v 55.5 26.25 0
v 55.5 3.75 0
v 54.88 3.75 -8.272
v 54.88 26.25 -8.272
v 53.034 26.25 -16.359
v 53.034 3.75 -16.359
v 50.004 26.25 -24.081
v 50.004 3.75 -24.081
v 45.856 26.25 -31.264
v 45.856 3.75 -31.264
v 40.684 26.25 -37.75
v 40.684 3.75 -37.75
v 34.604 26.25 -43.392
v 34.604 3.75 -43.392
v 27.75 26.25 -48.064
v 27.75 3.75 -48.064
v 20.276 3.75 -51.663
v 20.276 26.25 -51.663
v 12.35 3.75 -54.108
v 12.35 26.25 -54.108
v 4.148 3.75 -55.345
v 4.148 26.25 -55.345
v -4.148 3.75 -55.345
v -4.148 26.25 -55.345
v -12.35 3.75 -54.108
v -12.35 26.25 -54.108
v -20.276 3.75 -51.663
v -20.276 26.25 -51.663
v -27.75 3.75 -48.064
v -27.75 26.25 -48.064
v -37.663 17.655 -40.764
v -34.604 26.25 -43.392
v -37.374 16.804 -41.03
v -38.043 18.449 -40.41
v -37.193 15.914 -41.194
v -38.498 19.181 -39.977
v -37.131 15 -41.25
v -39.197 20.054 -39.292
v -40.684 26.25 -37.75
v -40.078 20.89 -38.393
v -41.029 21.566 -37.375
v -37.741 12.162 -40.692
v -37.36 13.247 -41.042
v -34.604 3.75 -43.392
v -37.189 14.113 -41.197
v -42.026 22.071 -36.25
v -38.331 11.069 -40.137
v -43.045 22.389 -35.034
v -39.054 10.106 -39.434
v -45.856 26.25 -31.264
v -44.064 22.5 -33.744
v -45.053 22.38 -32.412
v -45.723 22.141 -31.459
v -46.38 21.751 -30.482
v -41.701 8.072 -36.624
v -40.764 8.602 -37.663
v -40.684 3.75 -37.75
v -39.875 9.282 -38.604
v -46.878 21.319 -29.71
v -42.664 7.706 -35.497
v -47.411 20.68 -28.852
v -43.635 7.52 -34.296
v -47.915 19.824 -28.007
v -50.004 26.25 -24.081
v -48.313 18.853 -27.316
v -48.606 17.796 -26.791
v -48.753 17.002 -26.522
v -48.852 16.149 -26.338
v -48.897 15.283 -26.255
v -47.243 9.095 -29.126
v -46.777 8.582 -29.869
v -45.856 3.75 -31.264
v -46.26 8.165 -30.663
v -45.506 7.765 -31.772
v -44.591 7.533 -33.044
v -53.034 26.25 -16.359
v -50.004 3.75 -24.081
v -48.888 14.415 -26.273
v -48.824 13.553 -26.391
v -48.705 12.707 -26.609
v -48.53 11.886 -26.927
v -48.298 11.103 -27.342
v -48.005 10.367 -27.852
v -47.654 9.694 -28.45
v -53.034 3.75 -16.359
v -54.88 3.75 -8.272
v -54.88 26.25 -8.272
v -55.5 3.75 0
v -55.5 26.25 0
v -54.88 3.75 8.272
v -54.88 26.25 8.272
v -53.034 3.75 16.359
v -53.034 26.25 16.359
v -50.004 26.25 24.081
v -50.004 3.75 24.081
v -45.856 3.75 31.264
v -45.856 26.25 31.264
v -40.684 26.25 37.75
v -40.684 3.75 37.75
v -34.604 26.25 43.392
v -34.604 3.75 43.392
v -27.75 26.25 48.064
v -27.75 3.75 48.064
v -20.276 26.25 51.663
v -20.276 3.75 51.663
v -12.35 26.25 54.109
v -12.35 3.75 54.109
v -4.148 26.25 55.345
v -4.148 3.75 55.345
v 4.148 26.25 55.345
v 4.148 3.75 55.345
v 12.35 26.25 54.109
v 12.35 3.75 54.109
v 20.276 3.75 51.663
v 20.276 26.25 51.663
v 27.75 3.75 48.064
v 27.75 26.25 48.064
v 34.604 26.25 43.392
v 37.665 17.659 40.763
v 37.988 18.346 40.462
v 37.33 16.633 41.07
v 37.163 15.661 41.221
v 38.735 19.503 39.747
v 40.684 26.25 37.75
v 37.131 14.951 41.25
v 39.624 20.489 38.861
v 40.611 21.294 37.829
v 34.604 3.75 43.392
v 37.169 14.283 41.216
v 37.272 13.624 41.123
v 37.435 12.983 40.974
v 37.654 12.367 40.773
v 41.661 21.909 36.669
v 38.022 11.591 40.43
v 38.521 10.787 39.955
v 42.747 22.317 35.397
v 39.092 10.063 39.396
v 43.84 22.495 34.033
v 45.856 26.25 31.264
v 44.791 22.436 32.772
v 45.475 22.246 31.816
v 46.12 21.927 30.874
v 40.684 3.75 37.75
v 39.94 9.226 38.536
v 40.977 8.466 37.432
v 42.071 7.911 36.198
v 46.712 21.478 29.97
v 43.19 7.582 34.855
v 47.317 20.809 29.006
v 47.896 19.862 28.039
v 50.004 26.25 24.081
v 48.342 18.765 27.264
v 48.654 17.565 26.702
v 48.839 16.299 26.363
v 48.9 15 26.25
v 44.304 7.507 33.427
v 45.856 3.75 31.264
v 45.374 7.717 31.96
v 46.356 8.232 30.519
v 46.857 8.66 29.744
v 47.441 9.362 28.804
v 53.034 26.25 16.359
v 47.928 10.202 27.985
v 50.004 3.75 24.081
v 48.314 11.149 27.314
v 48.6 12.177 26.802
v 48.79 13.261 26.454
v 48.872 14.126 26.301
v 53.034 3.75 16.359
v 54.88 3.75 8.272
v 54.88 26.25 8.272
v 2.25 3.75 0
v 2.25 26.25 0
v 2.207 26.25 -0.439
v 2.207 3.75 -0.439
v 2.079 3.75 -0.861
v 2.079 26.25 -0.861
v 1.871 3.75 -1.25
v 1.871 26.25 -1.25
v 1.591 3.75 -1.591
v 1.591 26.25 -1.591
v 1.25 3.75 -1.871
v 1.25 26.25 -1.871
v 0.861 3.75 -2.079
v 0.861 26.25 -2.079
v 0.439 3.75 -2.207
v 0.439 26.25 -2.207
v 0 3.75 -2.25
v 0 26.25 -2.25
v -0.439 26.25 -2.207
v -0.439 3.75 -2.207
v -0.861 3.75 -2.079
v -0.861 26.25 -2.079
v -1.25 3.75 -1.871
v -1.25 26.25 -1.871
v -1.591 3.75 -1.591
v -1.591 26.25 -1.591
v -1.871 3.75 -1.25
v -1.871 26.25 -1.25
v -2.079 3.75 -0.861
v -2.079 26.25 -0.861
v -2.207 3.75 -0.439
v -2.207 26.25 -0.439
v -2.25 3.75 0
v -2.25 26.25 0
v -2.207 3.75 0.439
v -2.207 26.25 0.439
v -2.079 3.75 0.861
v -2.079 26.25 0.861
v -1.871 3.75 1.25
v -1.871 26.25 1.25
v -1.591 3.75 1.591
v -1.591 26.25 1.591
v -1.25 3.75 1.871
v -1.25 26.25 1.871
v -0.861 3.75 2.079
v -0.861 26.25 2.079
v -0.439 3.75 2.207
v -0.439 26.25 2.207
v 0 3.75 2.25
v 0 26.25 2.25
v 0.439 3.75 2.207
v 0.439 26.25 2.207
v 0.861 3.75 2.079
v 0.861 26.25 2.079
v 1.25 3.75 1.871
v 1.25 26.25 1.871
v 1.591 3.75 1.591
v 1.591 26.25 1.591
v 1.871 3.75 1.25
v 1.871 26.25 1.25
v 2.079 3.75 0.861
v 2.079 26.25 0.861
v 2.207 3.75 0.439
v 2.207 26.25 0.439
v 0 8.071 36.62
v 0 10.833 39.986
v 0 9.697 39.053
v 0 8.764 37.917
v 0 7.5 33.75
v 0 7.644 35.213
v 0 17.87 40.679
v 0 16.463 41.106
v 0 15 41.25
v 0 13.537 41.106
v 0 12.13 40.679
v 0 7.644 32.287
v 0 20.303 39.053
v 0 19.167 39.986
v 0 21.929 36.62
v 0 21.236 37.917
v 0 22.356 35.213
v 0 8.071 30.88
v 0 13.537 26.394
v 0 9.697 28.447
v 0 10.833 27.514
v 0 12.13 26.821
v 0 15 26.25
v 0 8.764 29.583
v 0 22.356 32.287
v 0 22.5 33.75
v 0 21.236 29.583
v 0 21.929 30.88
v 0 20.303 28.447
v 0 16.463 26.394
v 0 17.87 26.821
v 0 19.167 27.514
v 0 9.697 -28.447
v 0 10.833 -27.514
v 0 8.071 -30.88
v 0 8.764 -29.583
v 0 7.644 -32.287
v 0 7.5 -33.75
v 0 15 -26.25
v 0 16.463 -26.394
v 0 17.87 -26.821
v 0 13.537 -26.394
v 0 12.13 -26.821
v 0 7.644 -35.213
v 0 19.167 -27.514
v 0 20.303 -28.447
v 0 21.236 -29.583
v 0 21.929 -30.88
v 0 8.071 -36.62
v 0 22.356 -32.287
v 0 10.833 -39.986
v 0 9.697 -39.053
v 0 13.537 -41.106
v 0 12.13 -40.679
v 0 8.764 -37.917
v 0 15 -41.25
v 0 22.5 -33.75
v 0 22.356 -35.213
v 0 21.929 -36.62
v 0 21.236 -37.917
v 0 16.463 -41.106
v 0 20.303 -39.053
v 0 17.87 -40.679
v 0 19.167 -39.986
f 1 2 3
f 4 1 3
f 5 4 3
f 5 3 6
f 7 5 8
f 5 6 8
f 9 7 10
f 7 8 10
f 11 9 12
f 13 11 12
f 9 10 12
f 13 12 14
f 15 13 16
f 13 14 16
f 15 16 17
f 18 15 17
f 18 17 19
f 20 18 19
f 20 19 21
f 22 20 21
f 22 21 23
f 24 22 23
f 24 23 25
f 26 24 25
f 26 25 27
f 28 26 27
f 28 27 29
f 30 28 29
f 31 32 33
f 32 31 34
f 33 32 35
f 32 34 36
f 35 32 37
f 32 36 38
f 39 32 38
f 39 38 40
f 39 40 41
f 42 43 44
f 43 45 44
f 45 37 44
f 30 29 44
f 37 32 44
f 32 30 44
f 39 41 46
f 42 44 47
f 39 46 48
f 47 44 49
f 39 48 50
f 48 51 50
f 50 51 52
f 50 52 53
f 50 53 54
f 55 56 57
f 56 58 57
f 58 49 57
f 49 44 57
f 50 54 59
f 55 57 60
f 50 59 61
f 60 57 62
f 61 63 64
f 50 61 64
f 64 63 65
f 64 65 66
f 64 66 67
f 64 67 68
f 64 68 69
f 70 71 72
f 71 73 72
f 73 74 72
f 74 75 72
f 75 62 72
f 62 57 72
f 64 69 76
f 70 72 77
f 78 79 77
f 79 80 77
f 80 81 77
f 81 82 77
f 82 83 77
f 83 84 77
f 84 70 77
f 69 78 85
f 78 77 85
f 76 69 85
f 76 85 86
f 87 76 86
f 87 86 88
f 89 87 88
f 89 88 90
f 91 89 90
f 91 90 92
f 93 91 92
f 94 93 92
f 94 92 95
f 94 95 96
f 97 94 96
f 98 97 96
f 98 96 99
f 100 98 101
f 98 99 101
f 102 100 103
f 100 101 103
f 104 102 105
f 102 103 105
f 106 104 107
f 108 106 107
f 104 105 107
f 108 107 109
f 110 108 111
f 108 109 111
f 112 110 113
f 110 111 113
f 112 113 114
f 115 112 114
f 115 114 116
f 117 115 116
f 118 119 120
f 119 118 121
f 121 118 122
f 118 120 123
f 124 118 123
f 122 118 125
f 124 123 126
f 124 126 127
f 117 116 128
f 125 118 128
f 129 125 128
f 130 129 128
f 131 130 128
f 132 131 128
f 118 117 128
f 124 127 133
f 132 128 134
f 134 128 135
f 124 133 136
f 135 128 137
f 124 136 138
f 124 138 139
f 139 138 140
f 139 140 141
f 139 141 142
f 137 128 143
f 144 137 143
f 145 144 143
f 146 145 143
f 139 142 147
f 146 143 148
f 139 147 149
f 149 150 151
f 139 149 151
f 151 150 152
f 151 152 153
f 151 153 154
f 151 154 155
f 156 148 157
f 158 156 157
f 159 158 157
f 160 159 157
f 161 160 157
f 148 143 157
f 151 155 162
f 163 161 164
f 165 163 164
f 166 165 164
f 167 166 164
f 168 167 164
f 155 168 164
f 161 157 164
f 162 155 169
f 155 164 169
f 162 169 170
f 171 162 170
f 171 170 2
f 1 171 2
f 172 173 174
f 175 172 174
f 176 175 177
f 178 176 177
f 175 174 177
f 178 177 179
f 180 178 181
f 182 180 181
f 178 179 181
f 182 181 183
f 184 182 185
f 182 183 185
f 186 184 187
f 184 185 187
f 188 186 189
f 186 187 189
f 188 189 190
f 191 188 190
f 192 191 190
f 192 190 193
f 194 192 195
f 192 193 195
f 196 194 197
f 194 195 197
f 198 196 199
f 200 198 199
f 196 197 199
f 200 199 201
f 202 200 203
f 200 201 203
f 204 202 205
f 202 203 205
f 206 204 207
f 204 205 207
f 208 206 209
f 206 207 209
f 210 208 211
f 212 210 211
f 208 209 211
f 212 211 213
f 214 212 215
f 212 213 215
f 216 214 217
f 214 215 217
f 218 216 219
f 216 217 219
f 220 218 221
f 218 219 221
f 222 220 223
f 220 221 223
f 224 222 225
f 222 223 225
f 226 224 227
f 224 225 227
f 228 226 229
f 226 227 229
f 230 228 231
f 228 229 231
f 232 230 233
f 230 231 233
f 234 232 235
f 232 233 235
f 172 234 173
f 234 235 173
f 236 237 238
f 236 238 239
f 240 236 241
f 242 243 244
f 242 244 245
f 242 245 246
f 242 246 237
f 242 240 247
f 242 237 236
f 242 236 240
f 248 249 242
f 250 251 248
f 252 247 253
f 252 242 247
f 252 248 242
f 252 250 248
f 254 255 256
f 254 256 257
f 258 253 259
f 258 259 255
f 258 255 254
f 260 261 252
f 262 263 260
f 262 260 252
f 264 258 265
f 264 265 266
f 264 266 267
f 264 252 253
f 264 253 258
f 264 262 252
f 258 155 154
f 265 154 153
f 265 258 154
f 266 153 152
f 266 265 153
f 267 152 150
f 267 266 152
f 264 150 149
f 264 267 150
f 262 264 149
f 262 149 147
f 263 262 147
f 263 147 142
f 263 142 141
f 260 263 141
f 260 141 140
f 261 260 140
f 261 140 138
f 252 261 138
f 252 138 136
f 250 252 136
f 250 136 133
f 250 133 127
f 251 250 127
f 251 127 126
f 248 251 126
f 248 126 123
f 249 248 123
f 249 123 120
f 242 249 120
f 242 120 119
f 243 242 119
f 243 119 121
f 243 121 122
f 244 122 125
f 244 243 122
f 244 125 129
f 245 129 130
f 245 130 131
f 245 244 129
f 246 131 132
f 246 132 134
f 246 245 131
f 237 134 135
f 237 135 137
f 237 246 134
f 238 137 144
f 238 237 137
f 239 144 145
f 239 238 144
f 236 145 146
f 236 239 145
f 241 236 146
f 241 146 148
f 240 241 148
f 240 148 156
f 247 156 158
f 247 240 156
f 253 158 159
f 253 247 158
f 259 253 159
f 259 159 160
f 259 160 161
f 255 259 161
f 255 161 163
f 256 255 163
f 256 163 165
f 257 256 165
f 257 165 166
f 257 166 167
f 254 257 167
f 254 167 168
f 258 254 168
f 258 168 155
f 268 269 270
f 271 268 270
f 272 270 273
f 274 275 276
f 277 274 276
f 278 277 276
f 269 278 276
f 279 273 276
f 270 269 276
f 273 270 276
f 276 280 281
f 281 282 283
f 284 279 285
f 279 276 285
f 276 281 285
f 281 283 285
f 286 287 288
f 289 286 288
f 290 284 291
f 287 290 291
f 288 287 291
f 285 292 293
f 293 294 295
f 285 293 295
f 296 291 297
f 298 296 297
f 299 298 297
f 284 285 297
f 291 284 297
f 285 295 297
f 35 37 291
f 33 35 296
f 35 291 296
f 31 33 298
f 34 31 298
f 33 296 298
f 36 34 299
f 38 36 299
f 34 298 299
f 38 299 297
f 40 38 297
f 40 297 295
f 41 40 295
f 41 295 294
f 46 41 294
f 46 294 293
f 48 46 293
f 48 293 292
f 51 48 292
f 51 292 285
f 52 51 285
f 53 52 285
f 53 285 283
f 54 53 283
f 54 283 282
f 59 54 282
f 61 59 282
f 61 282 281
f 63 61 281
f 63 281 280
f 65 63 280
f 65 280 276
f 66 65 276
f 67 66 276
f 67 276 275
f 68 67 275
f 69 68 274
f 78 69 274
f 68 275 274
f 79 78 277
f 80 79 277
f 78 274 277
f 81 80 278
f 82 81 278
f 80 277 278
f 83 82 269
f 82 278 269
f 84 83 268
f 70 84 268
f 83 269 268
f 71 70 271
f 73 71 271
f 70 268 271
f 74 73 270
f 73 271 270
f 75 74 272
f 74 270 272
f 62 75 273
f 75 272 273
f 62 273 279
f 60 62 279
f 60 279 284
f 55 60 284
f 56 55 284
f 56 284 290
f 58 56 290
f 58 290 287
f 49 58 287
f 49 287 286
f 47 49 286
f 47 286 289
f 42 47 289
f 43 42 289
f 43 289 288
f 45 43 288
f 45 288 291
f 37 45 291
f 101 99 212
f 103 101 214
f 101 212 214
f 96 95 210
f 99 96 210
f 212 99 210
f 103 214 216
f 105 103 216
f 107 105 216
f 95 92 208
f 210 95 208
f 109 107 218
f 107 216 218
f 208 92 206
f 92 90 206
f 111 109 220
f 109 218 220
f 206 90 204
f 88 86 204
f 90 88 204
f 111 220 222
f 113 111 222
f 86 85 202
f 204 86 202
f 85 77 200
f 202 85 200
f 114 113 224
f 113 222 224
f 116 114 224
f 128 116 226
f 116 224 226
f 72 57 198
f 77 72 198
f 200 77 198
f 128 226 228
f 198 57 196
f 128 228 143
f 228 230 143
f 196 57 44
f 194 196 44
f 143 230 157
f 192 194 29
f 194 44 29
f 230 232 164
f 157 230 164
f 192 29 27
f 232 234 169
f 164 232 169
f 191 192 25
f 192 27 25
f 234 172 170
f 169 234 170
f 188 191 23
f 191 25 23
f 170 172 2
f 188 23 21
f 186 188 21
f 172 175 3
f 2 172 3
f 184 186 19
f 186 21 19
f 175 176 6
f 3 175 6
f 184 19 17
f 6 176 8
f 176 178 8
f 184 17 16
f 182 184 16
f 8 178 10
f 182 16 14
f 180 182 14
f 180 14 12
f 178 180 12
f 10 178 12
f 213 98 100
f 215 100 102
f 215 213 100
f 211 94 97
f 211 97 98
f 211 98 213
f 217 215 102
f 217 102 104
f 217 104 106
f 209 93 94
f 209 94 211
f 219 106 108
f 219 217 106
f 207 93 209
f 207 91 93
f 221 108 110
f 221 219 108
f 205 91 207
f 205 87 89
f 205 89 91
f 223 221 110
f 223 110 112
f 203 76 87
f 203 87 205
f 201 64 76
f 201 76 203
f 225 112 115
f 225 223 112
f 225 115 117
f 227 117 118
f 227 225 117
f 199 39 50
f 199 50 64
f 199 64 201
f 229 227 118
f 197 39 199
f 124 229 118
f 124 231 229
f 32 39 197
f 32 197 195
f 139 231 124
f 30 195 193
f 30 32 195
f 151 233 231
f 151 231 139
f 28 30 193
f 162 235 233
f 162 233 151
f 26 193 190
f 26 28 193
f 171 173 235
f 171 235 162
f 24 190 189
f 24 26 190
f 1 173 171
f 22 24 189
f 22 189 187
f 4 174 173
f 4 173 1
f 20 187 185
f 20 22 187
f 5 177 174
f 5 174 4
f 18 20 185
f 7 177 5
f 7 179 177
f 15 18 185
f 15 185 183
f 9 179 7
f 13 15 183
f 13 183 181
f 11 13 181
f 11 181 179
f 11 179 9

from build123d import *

# Parameters (mm, degrees)
SKETCH1_R           = 74
BOSS_EXTRUDE1_DEPTH = 30
SKETCH2_R           = 10
CUT_EXTRUDE1_DEPTH  = 80
SKETCH3_R           = 10
CUT_EXTRUDE2_DEPTH  = 80
SKETCH6_R           = 3
CUT_EXTRUDE4_DEPTH  = 30
SCALE1_SCALE        = 0.75


with BuildPart() as part:
    # Sketch1 → Boss-Extrude1 (new body)
    with BuildSketch(Plane(origin=(0, 0, 0), x_dir=(1, 0, 0), z_dir=(0, 1, 0))):
        Circle(SKETCH1_R)
    extrude(amount=BOSS_EXTRUDE1_DEPTH)

    # Sketch2 → Cut-Extrude1 (cut)
    with BuildSketch(Plane(origin=(0, 0, 0), x_dir=(0, 0, -1), z_dir=(1, 0, 0))):
        with Locations((45, 15)):
            Circle(SKETCH2_R)
    extrude(amount=-CUT_EXTRUDE1_DEPTH, mode=Mode.SUBTRACT)

    # Sketch3 → Cut-Extrude2 (cut)
    with BuildSketch(Plane(origin=(0, 0, 0), x_dir=(0, 0, -1), z_dir=(1, 0, 0))):
        with Locations((-45, 15)):
            Circle(SKETCH3_R)
    extrude(amount=CUT_EXTRUDE2_DEPTH, mode=Mode.SUBTRACT)

    # Sketch6 → Cut-Extrude4 (cut)
    with BuildSketch(Plane(origin=(0, 30, 0), x_dir=(1, 0, 0), z_dir=(0, 1, 0))):
        Circle(SKETCH6_R)
    extrude(amount=-CUT_EXTRUDE4_DEPTH, mode=Mode.SUBTRACT)


with BuildPart() as part_1:
    # Scale1: scaled about (-3.1666e-05, 14.999981435, 5.427e-06)
    add(part.part.scale(SCALE1_SCALE).moved(Location((-7.916e-06, 3.749995359, 1.357e-06))))


solid = part_1.part
